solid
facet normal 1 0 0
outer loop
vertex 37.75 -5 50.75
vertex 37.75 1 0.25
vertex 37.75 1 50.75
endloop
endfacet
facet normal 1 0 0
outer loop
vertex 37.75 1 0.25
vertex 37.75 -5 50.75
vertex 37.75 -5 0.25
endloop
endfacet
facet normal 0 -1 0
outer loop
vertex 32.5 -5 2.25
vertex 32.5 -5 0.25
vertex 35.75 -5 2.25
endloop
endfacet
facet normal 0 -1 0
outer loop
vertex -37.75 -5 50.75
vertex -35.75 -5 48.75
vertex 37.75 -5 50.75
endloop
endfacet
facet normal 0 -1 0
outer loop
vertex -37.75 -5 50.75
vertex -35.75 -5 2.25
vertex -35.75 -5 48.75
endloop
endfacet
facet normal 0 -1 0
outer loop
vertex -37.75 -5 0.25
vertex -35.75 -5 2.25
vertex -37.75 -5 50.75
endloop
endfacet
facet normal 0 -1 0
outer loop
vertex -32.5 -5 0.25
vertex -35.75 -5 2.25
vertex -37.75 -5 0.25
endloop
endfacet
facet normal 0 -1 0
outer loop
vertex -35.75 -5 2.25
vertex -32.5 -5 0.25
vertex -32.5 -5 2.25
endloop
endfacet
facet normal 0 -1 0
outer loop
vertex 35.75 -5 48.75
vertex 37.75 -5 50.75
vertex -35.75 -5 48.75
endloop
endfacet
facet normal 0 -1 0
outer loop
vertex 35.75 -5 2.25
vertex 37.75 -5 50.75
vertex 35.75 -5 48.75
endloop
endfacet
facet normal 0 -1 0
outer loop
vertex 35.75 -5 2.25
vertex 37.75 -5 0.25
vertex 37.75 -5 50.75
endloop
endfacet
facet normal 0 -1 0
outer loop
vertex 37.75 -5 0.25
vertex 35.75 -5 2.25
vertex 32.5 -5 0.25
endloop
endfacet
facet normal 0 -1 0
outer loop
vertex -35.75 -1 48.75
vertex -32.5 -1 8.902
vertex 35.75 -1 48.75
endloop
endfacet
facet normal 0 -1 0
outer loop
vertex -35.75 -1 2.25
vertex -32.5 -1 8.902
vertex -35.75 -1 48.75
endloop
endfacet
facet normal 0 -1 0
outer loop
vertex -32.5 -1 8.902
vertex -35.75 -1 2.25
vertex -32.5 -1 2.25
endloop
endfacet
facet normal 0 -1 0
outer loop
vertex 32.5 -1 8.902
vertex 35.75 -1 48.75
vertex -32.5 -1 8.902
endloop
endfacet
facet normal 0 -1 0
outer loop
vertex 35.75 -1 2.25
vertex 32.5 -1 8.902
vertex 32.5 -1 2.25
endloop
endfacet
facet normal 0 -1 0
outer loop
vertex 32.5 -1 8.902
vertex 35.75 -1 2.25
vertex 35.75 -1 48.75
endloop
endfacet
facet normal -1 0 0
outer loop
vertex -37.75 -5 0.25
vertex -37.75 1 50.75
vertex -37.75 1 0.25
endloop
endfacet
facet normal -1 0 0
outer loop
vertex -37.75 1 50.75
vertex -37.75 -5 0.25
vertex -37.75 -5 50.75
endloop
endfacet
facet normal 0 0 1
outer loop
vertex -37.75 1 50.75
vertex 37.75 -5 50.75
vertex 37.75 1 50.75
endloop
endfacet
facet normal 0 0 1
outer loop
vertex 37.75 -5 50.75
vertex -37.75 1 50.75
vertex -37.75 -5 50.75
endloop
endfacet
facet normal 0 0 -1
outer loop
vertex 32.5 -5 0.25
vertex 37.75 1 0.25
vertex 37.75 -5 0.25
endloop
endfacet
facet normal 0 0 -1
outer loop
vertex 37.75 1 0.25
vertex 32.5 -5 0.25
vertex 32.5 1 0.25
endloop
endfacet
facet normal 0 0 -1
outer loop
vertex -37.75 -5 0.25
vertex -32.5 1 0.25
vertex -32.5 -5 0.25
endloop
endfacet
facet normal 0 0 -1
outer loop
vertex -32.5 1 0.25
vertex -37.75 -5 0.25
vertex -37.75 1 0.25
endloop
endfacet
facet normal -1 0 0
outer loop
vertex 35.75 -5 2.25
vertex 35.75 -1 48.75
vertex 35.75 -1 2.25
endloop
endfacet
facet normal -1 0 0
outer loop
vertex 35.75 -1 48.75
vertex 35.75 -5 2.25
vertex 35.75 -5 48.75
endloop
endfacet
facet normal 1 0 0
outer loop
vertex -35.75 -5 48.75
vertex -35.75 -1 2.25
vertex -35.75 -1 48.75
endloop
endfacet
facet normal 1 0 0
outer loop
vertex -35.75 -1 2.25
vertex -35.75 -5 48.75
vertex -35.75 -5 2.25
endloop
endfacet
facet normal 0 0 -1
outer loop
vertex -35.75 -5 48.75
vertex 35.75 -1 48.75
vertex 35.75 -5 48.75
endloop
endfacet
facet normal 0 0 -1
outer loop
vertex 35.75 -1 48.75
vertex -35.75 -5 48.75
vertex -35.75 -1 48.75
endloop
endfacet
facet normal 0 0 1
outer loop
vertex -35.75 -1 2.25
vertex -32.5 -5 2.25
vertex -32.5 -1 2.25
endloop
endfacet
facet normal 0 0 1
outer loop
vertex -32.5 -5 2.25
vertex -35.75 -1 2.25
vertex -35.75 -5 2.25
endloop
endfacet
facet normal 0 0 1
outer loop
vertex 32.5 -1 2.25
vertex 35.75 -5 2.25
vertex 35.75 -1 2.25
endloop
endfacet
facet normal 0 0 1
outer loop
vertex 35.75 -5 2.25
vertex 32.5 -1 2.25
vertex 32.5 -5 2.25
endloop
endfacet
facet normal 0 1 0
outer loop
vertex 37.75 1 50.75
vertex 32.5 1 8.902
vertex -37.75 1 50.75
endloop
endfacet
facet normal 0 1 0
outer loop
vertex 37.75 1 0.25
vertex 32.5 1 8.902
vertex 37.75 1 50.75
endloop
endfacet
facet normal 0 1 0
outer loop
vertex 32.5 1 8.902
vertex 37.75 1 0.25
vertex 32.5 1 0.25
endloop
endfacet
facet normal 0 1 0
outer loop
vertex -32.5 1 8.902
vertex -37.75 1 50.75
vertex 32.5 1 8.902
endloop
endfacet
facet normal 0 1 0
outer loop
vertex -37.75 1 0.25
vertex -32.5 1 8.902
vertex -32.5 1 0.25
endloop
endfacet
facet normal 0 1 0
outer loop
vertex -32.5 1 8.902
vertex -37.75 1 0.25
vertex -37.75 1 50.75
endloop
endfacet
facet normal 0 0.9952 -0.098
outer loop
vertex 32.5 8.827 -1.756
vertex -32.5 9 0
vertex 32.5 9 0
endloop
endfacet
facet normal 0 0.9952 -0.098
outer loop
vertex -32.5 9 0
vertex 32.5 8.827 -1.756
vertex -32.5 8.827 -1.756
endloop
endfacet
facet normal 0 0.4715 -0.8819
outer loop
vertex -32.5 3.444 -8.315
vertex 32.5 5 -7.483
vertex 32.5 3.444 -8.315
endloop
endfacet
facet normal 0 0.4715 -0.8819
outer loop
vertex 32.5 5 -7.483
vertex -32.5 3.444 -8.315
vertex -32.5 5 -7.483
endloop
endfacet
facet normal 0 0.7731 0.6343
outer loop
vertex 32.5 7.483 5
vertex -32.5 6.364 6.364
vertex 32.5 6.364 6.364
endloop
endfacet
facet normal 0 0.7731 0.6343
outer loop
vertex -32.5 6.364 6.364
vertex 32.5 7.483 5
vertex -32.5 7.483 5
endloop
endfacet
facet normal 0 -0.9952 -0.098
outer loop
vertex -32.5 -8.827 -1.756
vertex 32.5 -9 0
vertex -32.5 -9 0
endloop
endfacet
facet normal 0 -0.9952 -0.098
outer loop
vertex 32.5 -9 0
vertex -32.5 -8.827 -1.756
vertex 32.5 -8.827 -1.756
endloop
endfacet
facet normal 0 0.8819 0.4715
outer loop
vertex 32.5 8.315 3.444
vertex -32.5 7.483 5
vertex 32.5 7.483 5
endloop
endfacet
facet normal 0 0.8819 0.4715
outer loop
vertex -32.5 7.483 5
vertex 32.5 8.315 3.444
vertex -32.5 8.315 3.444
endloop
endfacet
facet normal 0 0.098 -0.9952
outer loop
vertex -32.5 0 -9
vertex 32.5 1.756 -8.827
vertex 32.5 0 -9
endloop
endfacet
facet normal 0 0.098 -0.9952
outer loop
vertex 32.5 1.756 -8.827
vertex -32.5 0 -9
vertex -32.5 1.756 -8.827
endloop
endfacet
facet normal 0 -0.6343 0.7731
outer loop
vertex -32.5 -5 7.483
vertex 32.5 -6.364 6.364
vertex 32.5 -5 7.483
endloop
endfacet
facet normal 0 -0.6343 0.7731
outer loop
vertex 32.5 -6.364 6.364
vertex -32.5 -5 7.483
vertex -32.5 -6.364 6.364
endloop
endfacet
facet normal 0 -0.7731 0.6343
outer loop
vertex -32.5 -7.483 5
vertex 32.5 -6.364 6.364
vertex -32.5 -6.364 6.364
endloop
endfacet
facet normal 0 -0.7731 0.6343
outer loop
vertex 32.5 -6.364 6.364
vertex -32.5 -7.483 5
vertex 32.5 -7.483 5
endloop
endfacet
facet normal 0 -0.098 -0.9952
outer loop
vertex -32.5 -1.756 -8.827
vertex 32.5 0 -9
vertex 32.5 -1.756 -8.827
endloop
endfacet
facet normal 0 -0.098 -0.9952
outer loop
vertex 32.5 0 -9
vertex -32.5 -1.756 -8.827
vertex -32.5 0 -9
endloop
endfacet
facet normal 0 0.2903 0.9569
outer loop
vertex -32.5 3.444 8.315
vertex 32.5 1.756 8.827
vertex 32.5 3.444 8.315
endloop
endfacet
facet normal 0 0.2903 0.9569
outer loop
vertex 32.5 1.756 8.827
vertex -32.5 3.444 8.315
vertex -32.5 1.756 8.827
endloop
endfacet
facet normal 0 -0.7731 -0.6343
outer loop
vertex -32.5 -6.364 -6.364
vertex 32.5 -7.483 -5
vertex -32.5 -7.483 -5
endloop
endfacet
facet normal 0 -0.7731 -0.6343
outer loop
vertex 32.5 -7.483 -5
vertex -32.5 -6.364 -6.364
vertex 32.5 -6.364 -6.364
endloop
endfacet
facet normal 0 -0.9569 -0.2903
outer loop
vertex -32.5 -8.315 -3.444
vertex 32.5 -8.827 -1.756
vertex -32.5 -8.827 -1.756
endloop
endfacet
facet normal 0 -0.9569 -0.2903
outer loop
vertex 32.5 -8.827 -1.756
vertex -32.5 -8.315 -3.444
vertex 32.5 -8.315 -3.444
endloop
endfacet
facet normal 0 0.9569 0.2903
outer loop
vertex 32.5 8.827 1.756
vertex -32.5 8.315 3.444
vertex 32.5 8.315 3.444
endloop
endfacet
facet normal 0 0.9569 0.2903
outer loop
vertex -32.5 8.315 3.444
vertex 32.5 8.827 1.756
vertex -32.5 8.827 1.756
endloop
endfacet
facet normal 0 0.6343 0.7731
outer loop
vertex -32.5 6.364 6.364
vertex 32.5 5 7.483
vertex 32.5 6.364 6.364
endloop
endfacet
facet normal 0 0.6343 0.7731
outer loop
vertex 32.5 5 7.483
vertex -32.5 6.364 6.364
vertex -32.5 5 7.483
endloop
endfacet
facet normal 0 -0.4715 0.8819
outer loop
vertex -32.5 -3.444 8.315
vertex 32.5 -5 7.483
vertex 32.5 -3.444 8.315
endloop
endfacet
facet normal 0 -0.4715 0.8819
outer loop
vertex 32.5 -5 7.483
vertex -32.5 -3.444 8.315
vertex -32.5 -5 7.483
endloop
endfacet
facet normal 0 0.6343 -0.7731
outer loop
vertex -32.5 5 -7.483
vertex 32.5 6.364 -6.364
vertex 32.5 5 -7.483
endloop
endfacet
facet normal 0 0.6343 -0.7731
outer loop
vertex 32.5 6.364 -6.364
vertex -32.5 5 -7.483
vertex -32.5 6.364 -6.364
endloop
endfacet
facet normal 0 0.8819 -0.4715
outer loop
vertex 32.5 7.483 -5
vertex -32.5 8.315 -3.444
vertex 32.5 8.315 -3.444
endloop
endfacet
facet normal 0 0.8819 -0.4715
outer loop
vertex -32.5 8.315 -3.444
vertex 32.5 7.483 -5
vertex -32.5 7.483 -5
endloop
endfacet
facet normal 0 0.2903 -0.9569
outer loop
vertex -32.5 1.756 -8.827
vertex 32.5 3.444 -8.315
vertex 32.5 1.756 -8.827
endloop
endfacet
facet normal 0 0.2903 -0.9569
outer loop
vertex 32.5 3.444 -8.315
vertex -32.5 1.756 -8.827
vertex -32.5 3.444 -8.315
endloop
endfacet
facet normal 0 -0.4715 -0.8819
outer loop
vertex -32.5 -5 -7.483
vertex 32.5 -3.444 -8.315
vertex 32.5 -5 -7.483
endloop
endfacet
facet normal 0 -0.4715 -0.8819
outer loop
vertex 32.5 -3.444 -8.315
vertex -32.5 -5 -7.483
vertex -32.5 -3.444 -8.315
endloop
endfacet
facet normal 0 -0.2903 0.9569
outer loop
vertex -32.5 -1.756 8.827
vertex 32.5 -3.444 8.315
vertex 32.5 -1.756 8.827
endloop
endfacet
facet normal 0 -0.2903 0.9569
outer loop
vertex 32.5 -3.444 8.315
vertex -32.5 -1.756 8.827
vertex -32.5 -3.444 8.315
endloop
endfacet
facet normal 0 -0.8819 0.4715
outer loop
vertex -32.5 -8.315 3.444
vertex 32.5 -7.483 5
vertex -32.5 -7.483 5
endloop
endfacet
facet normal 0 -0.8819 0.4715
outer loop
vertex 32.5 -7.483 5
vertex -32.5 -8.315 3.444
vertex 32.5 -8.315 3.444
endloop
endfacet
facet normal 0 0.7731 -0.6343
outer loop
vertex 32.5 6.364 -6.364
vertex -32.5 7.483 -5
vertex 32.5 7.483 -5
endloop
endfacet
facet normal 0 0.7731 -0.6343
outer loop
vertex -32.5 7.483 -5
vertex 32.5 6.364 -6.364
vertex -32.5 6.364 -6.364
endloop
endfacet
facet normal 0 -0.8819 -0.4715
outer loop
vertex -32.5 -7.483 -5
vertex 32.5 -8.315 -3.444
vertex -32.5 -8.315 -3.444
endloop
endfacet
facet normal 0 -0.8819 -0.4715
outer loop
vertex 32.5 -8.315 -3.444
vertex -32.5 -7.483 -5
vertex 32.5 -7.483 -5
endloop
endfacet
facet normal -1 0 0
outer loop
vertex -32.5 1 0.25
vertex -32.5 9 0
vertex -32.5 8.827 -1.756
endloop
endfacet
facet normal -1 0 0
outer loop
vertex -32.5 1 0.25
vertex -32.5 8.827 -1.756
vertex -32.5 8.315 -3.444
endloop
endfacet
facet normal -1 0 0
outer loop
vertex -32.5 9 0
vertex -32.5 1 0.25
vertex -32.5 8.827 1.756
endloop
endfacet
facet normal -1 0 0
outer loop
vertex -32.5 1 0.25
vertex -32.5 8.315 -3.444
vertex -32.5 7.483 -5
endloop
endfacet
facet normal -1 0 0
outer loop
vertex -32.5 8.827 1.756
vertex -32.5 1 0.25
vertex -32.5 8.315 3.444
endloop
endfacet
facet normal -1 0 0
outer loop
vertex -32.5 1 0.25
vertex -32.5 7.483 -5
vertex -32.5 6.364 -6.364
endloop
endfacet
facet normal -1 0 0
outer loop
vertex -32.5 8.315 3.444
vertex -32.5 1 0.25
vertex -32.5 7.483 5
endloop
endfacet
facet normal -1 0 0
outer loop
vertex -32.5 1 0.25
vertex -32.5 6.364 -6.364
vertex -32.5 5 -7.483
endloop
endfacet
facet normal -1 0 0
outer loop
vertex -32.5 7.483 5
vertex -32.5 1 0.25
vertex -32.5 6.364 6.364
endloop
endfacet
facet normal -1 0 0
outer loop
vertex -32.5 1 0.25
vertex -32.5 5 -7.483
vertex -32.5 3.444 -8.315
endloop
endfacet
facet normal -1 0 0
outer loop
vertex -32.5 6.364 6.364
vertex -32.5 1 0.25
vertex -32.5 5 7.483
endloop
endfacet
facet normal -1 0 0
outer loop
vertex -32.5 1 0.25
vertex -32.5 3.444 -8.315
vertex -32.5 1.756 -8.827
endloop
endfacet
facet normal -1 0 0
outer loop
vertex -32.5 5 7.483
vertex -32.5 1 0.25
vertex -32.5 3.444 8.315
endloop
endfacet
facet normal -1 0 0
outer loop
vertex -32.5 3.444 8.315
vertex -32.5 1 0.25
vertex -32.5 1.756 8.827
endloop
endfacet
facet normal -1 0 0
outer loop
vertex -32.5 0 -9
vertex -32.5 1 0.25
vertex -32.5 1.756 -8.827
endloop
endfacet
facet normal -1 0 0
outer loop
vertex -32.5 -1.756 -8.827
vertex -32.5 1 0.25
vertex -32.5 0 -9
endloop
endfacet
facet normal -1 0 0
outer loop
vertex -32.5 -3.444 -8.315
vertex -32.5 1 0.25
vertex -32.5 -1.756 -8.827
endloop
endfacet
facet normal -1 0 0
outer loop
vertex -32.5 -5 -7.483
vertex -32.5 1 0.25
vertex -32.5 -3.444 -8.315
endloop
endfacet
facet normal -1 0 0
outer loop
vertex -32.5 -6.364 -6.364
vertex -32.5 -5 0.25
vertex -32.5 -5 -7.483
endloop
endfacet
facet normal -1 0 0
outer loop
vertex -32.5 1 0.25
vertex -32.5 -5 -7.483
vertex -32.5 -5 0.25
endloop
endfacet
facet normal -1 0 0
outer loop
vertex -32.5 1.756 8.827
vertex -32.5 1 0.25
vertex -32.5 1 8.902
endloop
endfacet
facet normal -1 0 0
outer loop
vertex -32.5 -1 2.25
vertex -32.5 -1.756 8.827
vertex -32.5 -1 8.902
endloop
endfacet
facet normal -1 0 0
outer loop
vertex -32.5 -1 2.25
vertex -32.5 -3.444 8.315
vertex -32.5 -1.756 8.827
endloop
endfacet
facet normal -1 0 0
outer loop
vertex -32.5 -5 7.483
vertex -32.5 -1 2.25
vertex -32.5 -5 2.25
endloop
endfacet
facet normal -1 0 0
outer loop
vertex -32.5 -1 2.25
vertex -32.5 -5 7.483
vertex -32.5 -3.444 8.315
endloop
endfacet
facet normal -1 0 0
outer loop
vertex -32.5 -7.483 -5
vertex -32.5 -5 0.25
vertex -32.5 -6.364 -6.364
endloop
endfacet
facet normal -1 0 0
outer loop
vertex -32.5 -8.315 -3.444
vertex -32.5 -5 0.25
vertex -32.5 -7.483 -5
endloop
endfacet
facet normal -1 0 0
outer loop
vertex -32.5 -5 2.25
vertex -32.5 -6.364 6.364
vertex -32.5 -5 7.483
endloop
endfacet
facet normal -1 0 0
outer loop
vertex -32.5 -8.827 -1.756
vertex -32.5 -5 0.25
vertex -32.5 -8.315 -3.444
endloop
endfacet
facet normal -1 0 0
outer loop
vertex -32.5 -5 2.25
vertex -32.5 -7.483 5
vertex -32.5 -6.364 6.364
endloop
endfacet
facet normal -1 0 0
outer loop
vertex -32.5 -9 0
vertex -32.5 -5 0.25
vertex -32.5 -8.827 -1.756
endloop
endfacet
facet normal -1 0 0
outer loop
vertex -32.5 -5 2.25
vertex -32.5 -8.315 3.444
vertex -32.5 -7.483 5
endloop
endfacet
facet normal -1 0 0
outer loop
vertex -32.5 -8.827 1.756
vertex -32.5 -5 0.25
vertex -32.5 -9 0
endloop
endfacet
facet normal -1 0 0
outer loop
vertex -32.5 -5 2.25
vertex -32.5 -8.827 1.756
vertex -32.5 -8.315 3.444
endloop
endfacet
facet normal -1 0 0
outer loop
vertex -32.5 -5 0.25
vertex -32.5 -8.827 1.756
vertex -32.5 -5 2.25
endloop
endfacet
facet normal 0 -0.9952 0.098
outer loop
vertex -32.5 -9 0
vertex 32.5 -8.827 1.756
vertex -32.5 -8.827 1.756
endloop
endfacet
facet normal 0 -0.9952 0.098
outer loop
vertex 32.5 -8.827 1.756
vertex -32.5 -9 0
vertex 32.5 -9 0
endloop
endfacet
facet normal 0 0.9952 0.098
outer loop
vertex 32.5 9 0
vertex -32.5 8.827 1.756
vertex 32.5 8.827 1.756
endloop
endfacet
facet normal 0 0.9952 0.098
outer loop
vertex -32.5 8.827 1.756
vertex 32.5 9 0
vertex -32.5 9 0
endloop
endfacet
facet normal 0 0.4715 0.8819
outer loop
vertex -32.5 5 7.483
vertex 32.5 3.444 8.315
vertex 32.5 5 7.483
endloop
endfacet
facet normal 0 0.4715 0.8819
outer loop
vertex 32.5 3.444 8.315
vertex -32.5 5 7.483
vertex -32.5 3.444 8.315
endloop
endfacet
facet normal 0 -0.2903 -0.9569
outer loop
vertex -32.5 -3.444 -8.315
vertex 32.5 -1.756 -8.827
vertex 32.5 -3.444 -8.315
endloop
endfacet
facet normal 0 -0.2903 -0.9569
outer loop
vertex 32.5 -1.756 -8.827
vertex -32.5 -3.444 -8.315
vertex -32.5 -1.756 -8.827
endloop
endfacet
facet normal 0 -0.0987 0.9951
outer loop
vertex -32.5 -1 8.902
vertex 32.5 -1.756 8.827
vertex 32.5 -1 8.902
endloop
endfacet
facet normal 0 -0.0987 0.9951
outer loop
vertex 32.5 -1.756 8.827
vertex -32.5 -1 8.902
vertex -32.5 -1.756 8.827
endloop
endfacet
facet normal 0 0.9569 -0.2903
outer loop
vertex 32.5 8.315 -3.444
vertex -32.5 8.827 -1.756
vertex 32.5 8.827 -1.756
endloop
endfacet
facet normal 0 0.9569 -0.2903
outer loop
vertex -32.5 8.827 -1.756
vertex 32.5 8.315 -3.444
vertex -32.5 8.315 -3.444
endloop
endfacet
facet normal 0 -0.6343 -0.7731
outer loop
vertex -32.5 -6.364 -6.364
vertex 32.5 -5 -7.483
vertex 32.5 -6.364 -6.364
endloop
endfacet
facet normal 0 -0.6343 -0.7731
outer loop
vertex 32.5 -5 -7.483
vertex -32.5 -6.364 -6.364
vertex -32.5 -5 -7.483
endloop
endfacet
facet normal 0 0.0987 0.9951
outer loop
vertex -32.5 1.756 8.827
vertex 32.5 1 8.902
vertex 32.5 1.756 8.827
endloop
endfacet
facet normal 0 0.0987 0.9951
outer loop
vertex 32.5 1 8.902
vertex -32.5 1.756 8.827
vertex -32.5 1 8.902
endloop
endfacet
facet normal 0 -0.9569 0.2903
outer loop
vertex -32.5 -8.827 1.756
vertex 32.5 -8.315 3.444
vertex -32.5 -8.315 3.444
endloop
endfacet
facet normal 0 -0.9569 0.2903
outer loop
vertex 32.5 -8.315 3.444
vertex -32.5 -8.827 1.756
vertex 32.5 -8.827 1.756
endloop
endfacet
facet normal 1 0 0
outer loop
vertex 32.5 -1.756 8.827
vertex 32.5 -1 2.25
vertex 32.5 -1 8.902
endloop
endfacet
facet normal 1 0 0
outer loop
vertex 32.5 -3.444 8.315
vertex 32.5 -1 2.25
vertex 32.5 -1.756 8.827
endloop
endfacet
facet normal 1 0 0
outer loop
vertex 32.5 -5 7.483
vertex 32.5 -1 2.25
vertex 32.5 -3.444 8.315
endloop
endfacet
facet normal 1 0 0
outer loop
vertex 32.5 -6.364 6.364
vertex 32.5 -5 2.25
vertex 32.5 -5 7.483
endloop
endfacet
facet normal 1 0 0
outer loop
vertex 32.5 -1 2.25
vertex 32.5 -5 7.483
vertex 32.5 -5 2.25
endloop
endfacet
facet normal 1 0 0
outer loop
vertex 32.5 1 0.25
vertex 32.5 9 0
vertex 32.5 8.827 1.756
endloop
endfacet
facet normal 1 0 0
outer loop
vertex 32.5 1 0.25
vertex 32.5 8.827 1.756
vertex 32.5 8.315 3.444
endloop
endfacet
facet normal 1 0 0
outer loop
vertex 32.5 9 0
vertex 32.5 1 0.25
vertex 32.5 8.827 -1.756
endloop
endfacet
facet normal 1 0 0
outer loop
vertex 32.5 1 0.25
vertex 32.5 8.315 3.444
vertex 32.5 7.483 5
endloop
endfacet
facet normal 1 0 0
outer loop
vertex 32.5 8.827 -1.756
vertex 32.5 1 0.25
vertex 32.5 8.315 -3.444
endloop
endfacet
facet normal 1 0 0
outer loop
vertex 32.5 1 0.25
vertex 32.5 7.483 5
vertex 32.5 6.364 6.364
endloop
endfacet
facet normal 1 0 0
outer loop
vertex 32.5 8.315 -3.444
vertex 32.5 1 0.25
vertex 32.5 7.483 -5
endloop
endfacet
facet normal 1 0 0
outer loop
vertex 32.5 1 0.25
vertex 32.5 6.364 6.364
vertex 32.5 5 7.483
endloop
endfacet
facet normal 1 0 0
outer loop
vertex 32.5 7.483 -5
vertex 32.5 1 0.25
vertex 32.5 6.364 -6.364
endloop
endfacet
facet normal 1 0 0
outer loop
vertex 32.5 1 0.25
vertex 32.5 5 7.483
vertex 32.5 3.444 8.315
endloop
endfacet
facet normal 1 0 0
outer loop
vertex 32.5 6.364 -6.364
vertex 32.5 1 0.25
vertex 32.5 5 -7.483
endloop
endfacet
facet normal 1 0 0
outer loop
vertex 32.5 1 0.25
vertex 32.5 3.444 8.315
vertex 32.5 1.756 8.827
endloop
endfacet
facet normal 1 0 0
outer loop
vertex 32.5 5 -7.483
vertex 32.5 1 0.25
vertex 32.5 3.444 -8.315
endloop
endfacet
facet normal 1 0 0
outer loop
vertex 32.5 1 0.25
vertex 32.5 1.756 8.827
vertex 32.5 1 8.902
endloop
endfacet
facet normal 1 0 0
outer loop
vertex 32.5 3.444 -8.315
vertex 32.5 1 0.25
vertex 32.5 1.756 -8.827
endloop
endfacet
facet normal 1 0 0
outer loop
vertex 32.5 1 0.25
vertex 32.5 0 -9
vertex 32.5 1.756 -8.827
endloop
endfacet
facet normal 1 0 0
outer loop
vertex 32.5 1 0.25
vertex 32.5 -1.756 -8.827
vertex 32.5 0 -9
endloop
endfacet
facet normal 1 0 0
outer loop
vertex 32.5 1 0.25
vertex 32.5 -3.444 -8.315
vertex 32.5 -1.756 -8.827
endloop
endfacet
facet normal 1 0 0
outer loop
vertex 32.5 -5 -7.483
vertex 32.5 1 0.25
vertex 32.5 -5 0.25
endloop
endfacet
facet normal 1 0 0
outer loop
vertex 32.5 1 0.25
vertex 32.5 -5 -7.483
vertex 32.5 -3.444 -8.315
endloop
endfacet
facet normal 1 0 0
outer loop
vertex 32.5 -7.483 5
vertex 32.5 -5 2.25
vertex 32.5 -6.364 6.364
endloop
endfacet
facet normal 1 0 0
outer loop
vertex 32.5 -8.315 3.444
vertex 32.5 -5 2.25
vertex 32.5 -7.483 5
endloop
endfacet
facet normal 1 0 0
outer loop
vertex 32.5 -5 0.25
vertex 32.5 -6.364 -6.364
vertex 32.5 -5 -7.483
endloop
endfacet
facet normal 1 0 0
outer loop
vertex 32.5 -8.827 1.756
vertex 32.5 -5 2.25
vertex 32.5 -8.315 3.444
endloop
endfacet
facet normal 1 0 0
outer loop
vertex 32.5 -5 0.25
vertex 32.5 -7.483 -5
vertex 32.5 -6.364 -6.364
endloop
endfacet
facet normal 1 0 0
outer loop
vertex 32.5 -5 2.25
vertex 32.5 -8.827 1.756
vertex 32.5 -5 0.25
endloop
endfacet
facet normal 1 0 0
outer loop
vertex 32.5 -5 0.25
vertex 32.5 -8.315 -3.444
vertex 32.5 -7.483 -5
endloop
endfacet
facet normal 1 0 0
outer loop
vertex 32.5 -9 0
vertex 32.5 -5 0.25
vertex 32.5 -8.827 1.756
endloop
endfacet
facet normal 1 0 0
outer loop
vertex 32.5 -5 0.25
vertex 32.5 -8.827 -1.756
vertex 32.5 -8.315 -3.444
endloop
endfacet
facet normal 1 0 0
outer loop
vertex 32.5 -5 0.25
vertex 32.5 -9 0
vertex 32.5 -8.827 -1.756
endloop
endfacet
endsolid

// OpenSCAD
// file: akkum18650.scad
echo("Работа Полина Тугбаева");
d_akkum=18;
h_akkum=65;

akkum18650();

module akkum18650() {
color("purple")
cylinder(d=d_akkum, h=h_akkum, $fn=32, center=true);
}
// main file
use <akkum18650.scad>

echo("Работа Полина Тугбаева");
thickness_frame = 4;
thickness_walls = 2;
thickness_bottom = 2;

w_back = 70;
h_back = 45;
thickness_back = 1;
h_walls = 4;
gap_backlight = 1.5;


//rotate([90, 0, 0])
//translate([0, 0, 4])
//backlight();
//kit_frame();
//akkum18650();
build_frame();

module build_frame() {
    translate([0, 0, h_back/2+2*gap_backlight])
    rotate([90, 0, 0])
    kit_frame();
    rotate([0, 90, 0])
    akkum18650();    
}
module kit_frame(){
    bottom();
    translate([0,0,h_walls/2+thickness_bottom/2])
    walls();
}
module walls(){
    difference(){
        cube([w_back+2*thickness_walls+gap_backlight, h_back+2*thickness_walls+gap_backlight, h_walls], center = true);
        color("red")
        cube([w_back+gap_backlight, h_back+gap_backlight, h_walls+1], center = true);
    }
}
module backlight(){
    color("lightgreen")
    cube([w_back, h_back, thickness_back], center = true);
}

module bottom(){
    cube([w_back+2*thickness_walls+gap_backlight, h_back+2*thickness_walls+gap_backlight, thickness_bottom], center = true);
}
